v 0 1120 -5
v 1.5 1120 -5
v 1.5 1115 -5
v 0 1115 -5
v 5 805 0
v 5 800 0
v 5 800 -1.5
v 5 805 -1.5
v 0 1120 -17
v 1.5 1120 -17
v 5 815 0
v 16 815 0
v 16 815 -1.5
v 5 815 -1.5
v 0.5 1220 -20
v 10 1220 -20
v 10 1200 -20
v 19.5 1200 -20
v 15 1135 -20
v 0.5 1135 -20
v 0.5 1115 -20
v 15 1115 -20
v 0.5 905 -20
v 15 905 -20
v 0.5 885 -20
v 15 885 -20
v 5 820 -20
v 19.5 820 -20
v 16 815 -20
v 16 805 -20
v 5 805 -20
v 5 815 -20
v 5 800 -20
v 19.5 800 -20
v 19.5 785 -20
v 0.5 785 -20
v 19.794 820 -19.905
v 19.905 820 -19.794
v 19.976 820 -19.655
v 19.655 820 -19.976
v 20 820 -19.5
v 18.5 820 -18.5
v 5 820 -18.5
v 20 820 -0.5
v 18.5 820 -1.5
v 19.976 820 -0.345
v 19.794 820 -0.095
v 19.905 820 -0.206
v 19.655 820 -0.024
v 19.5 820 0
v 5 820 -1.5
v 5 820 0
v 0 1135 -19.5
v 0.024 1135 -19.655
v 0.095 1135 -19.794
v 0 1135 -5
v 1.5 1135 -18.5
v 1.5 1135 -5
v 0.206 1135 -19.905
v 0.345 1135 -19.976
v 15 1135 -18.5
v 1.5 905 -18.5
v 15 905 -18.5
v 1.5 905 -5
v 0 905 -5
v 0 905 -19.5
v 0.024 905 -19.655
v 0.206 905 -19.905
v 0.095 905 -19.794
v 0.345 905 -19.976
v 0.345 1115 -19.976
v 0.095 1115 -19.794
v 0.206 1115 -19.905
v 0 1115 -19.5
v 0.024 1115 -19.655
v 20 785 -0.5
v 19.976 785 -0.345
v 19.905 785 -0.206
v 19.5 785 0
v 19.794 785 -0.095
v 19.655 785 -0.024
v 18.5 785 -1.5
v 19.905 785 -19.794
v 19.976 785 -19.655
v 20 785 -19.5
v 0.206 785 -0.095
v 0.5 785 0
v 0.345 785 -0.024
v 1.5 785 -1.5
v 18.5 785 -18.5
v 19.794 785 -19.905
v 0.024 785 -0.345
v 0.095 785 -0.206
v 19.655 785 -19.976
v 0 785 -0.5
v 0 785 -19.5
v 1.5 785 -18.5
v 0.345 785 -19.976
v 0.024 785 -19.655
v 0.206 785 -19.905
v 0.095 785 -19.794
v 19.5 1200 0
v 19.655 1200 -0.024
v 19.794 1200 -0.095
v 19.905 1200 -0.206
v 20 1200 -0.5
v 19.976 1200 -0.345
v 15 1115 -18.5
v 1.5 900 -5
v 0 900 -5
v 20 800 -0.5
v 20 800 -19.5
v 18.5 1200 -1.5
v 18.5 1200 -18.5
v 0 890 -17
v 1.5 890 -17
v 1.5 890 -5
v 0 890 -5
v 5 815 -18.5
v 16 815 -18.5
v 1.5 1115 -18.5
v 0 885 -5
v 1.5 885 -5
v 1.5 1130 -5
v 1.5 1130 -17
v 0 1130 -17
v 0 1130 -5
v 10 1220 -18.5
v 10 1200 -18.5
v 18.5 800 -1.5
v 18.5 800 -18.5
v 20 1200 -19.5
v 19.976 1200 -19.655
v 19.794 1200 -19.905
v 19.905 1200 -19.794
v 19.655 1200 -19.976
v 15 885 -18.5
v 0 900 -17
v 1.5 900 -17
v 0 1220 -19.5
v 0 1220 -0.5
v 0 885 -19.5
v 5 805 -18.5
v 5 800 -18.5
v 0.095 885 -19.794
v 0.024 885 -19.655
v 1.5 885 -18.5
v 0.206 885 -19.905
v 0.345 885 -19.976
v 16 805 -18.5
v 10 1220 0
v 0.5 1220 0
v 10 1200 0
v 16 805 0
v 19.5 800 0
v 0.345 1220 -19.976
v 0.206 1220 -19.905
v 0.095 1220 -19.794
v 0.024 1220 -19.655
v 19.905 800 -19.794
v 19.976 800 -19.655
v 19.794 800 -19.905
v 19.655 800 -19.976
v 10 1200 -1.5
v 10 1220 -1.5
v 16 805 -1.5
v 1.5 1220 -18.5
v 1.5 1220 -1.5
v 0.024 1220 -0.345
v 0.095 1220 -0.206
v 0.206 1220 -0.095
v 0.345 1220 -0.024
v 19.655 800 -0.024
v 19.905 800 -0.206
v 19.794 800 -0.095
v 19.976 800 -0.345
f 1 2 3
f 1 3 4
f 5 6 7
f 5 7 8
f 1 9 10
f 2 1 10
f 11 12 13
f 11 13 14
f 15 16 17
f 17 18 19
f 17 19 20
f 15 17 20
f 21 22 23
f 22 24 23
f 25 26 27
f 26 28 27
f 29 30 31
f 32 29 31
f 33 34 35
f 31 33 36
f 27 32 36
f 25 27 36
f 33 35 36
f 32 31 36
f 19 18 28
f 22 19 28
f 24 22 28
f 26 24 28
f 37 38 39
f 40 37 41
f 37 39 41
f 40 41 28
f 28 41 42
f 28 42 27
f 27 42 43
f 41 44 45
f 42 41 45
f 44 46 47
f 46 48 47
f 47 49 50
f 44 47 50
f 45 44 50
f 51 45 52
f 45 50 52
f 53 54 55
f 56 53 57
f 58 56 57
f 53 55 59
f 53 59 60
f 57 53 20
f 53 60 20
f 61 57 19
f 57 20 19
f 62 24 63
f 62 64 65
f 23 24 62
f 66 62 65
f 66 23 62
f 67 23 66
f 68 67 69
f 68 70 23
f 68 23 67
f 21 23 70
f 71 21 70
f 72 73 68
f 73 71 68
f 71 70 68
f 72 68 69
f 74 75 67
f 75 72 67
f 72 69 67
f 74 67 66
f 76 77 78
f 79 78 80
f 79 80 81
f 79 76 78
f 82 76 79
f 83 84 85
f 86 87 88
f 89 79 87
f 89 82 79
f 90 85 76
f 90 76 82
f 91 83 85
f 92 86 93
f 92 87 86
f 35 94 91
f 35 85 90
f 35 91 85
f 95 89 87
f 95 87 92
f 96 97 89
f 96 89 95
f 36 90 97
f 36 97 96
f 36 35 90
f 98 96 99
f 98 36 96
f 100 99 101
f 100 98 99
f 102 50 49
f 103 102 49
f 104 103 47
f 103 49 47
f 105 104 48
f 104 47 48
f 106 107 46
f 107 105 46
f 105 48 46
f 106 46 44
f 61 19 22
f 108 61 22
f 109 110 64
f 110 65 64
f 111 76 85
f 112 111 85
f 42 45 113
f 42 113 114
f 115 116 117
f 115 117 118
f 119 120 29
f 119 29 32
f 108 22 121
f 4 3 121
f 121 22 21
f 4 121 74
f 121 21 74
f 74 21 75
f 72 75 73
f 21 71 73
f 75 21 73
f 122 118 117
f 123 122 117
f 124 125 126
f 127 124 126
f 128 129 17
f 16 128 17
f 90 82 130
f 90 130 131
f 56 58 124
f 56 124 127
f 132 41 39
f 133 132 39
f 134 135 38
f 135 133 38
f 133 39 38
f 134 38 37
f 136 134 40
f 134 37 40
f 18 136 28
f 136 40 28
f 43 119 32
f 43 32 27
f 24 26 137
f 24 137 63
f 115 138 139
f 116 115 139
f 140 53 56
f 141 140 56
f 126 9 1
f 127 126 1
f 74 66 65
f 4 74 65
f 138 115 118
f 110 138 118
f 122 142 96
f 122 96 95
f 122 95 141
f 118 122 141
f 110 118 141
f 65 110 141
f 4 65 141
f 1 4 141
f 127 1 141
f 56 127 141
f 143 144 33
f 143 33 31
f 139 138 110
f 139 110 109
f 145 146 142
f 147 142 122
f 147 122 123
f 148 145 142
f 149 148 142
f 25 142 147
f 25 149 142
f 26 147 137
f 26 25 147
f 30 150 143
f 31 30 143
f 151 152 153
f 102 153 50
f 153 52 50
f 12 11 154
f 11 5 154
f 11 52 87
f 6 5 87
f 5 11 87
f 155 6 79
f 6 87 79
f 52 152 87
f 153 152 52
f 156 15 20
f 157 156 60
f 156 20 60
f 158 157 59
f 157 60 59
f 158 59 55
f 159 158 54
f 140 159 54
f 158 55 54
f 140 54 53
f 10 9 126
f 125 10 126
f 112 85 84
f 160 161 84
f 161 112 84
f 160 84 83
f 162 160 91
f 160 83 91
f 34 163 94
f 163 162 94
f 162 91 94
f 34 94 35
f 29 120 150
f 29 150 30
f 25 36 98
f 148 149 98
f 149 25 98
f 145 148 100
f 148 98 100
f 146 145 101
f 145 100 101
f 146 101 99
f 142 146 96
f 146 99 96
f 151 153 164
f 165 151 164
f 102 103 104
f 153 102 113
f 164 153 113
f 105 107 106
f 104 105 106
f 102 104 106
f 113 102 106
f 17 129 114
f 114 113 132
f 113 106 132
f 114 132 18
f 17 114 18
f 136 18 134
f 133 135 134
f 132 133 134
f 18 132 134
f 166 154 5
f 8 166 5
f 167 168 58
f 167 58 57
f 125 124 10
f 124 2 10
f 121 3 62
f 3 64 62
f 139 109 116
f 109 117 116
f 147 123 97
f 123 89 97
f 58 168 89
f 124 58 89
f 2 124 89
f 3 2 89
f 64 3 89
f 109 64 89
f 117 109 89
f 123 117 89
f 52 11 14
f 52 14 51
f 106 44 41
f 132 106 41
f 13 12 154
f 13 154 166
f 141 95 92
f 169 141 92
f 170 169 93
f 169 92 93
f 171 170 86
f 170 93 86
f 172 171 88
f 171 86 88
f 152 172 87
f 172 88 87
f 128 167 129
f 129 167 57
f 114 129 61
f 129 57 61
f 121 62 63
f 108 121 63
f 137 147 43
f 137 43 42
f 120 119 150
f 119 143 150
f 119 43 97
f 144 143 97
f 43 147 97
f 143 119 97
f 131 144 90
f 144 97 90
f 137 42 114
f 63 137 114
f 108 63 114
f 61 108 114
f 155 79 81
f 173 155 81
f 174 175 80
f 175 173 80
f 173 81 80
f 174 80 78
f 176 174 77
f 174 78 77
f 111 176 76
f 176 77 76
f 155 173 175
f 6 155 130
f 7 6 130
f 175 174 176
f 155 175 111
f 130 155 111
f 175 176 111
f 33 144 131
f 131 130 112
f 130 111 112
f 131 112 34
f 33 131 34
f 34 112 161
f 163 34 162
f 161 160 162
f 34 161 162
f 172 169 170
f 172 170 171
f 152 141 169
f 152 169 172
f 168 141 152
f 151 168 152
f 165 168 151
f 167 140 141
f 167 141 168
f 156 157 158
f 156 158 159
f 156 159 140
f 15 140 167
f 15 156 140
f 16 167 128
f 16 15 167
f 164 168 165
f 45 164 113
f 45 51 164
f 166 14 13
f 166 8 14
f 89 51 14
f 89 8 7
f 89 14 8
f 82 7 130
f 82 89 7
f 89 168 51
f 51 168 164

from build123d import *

# Parameters (mm, degrees)
SKETCH1_W                   = 17
SKETCH1_H                   = 17
BOSS_EXTRUDE1_DEPTH         = 1220
SKETCH2_W                   = 20
SKETCH2_H                   = 20
CUT_EXTRUDE1_DEPTH          = 10
CUT_EXTRUDE2_DEPTH          = 15
SKETCH4_W                   = 3
SKETCH4_H                   = 10
CUT_EXTRUDE3_DEPTH          = 10
SKETCH_PATTERN1_START       = -20
SKETCH_PATTERN1_DEPTH       = 15
SKETCH_PATTERN1_2_OUTLINE_W = 1.5
SKETCH_PATTERN1_2_OUTLINE_H = 10
SKETCH_PATTERN1_2_DEPTH     = 3
SKETCH6_W                   = 20
SKETCH6_H                   = 20
CUT_EXTRUDE4_DEPTH          = 4
CUT_EXTRUDE5_DEPTH          = 1221.327824808
CUT_EXTRUDE5_DEPTH_BACK     = 1221.327824808
SKETCH7_W                   = 11
SKETCH7_H                   = 5
SKETCH8_W                   = 20.081282068
SKETCH8_H                   = 792.599518512
CUT_EXTRUDE6_DEPTH          = 20


# Read off the part's stored shape, not the designer's step: Sketch-Pattern1
with BuildPart() as part:
    # Sketch1 → Boss-Extrude1 (new body)
    with BuildSketch(Plane(origin=(0, 0, 0), x_dir=(1, 0, 0), z_dir=(0, 1, 0))):
        with BuildLine():
            Line((0.5, 0), (19.5, 0))
            ThreePointArc((19.5, 0), (19.853553391, 0.146446609), (20, 0.5))
            Line((20, 0.5), (20, 19.5))
            ThreePointArc((20, 19.5), (19.853553391, 19.853553391), (19.5, 20))
            Line((19.5, 20), (0.5, 20))
            ThreePointArc((0.5, 20), (0.146446609, 19.853553391), (0, 19.5))
            Line((0, 19.5), (0, 0.5))
            ThreePointArc((0, 0.5), (0.146446609, 0.146446609), (0.5, 0))
        make_face()
        with Locations((10, 10)):
            Rectangle(SKETCH1_W, SKETCH1_H, mode=Mode.SUBTRACT)
    extrude(amount=BOSS_EXTRUDE1_DEPTH)

    # Sketch2 → Cut-Extrude1 (cut)
    with BuildSketch(Plane(origin=(20, 0, 0), x_dir=(0, 0, -1), z_dir=(1, 0, 0))):
        with Locations((10, 1210)):
            Rectangle(SKETCH2_W, SKETCH2_H)
        with Locations((10, 10)):
            Rectangle(SKETCH2_W, SKETCH2_H)
    extrude(amount=-CUT_EXTRUDE1_DEPTH, mode=Mode.SUBTRACT)

    # Sketch3 → Cut-Extrude2 (cut)
    with BuildSketch(Plane(origin=(0, 0, -20), x_dir=(-1, 0, 0), z_dir=(0, 0, -1))):
        Polygon((-15, 1115), (0, 1115), (0, 1120), (-9, 1120), (-9, 1130), (0, 1130), (0, 1135), (-15, 1135), align=None)
    extrude(amount=-CUT_EXTRUDE2_DEPTH, mode=Mode.SUBTRACT)

    # Sketch4 → Cut-Extrude3 (cut)
    with BuildSketch(Plane.ZY):
        with Locations((-18.5, 1125)):
            Rectangle(SKETCH4_W, SKETCH4_H)
    extrude(amount=-CUT_EXTRUDE3_DEPTH, mode=Mode.SUBTRACT)

    # Sketch-Pattern1 outline → Sketch-Pattern1 (cut)
    with BuildSketch(Plane.XY.offset(SKETCH_PATTERN1_START)):
        Polygon((15, 105), (15, 125), (0, 125), (0, 120), (1.5, 120), (1.5, 110), (0, 110), (0, 105), align=None)
        Polygon((1.5, 350), (1.5, 340), (0, 340), (0, 335), (15, 335), (15, 355), (0, 355), (0, 350), align=None)
        Polygon((1.5, 510), (1.5, 500), (0, 500), (0, 495), (15, 495), (15, 515), (0, 515), (0, 510), align=None)
        Polygon((1.5, 740), (1.5, 730), (0, 730), (0, 725), (15, 725), (15, 745), (0, 745), (0, 740), align=None)
        Polygon((1.5, 900), (1.5, 890), (0, 890), (0, 885), (15, 885), (15, 905), (0, 905), (0, 900), align=None)
    extrude(amount=SKETCH_PATTERN1_DEPTH, mode=Mode.SUBTRACT)

    # Sketch-Pattern1 2 outline → Sketch-Pattern1 2 (cut)
    with BuildSketch(Plane.XY.offset(SKETCH_PATTERN1_START)):
        with Locations((0.75, 115)):
            Rectangle(SKETCH_PATTERN1_2_OUTLINE_W, SKETCH_PATTERN1_2_OUTLINE_H)
        with Locations((0.75, 345)):
            Rectangle(SKETCH_PATTERN1_2_OUTLINE_W, SKETCH_PATTERN1_2_OUTLINE_H)
        with Locations((0.75, 505)):
            Rectangle(SKETCH_PATTERN1_2_OUTLINE_W, SKETCH_PATTERN1_2_OUTLINE_H)
        with Locations((0.75, 735)):
            Rectangle(SKETCH_PATTERN1_2_OUTLINE_W, SKETCH_PATTERN1_2_OUTLINE_H)
        with Locations((0.75, 895)):
            Rectangle(SKETCH_PATTERN1_2_OUTLINE_W, SKETCH_PATTERN1_2_OUTLINE_H)
    extrude(amount=SKETCH_PATTERN1_2_DEPTH, mode=Mode.SUBTRACT)

    # Sketch6 → Cut-Extrude4 (cut)
    with BuildSketch(Plane(origin=(20, 0, 0), x_dir=(0, 0, -1), z_dir=(1, 0, 0))):
        with Locations((10, 810)):
            Rectangle(SKETCH6_W, SKETCH6_H)
    extrude(amount=-CUT_EXTRUDE4_DEPTH, mode=Mode.SUBTRACT)

    # Sketch7 → Cut-Extrude5 (cut, two sides: drawn at the far end of the back side and taken through both)
    with BuildSketch(Plane(origin=(0, 0, -20), x_dir=(-1, 0, 0), z_dir=(0, 0, -1)).offset(-CUT_EXTRUDE5_DEPTH_BACK)):
        with Locations((-10.5, 817.5)):
            Rectangle(SKETCH7_W, SKETCH7_H)
        with Locations((-10.5, 802.5)):
            Rectangle(SKETCH7_W, SKETCH7_H)
    extrude(amount=CUT_EXTRUDE5_DEPTH + CUT_EXTRUDE5_DEPTH_BACK, mode=Mode.SUBTRACT)

    # Sketch8 → Cut-Extrude6 (cut)
    with BuildSketch(Plane(origin=(0, 0, -20), x_dir=(-1, 0, 0), z_dir=(0, 0, -1))):
        with Locations((-10.040641034, 388.700240744)):
            Rectangle(SKETCH8_W, SKETCH8_H)
    extrude(amount=-CUT_EXTRUDE6_DEPTH, mode=Mode.SUBTRACT)


solid = part.part
